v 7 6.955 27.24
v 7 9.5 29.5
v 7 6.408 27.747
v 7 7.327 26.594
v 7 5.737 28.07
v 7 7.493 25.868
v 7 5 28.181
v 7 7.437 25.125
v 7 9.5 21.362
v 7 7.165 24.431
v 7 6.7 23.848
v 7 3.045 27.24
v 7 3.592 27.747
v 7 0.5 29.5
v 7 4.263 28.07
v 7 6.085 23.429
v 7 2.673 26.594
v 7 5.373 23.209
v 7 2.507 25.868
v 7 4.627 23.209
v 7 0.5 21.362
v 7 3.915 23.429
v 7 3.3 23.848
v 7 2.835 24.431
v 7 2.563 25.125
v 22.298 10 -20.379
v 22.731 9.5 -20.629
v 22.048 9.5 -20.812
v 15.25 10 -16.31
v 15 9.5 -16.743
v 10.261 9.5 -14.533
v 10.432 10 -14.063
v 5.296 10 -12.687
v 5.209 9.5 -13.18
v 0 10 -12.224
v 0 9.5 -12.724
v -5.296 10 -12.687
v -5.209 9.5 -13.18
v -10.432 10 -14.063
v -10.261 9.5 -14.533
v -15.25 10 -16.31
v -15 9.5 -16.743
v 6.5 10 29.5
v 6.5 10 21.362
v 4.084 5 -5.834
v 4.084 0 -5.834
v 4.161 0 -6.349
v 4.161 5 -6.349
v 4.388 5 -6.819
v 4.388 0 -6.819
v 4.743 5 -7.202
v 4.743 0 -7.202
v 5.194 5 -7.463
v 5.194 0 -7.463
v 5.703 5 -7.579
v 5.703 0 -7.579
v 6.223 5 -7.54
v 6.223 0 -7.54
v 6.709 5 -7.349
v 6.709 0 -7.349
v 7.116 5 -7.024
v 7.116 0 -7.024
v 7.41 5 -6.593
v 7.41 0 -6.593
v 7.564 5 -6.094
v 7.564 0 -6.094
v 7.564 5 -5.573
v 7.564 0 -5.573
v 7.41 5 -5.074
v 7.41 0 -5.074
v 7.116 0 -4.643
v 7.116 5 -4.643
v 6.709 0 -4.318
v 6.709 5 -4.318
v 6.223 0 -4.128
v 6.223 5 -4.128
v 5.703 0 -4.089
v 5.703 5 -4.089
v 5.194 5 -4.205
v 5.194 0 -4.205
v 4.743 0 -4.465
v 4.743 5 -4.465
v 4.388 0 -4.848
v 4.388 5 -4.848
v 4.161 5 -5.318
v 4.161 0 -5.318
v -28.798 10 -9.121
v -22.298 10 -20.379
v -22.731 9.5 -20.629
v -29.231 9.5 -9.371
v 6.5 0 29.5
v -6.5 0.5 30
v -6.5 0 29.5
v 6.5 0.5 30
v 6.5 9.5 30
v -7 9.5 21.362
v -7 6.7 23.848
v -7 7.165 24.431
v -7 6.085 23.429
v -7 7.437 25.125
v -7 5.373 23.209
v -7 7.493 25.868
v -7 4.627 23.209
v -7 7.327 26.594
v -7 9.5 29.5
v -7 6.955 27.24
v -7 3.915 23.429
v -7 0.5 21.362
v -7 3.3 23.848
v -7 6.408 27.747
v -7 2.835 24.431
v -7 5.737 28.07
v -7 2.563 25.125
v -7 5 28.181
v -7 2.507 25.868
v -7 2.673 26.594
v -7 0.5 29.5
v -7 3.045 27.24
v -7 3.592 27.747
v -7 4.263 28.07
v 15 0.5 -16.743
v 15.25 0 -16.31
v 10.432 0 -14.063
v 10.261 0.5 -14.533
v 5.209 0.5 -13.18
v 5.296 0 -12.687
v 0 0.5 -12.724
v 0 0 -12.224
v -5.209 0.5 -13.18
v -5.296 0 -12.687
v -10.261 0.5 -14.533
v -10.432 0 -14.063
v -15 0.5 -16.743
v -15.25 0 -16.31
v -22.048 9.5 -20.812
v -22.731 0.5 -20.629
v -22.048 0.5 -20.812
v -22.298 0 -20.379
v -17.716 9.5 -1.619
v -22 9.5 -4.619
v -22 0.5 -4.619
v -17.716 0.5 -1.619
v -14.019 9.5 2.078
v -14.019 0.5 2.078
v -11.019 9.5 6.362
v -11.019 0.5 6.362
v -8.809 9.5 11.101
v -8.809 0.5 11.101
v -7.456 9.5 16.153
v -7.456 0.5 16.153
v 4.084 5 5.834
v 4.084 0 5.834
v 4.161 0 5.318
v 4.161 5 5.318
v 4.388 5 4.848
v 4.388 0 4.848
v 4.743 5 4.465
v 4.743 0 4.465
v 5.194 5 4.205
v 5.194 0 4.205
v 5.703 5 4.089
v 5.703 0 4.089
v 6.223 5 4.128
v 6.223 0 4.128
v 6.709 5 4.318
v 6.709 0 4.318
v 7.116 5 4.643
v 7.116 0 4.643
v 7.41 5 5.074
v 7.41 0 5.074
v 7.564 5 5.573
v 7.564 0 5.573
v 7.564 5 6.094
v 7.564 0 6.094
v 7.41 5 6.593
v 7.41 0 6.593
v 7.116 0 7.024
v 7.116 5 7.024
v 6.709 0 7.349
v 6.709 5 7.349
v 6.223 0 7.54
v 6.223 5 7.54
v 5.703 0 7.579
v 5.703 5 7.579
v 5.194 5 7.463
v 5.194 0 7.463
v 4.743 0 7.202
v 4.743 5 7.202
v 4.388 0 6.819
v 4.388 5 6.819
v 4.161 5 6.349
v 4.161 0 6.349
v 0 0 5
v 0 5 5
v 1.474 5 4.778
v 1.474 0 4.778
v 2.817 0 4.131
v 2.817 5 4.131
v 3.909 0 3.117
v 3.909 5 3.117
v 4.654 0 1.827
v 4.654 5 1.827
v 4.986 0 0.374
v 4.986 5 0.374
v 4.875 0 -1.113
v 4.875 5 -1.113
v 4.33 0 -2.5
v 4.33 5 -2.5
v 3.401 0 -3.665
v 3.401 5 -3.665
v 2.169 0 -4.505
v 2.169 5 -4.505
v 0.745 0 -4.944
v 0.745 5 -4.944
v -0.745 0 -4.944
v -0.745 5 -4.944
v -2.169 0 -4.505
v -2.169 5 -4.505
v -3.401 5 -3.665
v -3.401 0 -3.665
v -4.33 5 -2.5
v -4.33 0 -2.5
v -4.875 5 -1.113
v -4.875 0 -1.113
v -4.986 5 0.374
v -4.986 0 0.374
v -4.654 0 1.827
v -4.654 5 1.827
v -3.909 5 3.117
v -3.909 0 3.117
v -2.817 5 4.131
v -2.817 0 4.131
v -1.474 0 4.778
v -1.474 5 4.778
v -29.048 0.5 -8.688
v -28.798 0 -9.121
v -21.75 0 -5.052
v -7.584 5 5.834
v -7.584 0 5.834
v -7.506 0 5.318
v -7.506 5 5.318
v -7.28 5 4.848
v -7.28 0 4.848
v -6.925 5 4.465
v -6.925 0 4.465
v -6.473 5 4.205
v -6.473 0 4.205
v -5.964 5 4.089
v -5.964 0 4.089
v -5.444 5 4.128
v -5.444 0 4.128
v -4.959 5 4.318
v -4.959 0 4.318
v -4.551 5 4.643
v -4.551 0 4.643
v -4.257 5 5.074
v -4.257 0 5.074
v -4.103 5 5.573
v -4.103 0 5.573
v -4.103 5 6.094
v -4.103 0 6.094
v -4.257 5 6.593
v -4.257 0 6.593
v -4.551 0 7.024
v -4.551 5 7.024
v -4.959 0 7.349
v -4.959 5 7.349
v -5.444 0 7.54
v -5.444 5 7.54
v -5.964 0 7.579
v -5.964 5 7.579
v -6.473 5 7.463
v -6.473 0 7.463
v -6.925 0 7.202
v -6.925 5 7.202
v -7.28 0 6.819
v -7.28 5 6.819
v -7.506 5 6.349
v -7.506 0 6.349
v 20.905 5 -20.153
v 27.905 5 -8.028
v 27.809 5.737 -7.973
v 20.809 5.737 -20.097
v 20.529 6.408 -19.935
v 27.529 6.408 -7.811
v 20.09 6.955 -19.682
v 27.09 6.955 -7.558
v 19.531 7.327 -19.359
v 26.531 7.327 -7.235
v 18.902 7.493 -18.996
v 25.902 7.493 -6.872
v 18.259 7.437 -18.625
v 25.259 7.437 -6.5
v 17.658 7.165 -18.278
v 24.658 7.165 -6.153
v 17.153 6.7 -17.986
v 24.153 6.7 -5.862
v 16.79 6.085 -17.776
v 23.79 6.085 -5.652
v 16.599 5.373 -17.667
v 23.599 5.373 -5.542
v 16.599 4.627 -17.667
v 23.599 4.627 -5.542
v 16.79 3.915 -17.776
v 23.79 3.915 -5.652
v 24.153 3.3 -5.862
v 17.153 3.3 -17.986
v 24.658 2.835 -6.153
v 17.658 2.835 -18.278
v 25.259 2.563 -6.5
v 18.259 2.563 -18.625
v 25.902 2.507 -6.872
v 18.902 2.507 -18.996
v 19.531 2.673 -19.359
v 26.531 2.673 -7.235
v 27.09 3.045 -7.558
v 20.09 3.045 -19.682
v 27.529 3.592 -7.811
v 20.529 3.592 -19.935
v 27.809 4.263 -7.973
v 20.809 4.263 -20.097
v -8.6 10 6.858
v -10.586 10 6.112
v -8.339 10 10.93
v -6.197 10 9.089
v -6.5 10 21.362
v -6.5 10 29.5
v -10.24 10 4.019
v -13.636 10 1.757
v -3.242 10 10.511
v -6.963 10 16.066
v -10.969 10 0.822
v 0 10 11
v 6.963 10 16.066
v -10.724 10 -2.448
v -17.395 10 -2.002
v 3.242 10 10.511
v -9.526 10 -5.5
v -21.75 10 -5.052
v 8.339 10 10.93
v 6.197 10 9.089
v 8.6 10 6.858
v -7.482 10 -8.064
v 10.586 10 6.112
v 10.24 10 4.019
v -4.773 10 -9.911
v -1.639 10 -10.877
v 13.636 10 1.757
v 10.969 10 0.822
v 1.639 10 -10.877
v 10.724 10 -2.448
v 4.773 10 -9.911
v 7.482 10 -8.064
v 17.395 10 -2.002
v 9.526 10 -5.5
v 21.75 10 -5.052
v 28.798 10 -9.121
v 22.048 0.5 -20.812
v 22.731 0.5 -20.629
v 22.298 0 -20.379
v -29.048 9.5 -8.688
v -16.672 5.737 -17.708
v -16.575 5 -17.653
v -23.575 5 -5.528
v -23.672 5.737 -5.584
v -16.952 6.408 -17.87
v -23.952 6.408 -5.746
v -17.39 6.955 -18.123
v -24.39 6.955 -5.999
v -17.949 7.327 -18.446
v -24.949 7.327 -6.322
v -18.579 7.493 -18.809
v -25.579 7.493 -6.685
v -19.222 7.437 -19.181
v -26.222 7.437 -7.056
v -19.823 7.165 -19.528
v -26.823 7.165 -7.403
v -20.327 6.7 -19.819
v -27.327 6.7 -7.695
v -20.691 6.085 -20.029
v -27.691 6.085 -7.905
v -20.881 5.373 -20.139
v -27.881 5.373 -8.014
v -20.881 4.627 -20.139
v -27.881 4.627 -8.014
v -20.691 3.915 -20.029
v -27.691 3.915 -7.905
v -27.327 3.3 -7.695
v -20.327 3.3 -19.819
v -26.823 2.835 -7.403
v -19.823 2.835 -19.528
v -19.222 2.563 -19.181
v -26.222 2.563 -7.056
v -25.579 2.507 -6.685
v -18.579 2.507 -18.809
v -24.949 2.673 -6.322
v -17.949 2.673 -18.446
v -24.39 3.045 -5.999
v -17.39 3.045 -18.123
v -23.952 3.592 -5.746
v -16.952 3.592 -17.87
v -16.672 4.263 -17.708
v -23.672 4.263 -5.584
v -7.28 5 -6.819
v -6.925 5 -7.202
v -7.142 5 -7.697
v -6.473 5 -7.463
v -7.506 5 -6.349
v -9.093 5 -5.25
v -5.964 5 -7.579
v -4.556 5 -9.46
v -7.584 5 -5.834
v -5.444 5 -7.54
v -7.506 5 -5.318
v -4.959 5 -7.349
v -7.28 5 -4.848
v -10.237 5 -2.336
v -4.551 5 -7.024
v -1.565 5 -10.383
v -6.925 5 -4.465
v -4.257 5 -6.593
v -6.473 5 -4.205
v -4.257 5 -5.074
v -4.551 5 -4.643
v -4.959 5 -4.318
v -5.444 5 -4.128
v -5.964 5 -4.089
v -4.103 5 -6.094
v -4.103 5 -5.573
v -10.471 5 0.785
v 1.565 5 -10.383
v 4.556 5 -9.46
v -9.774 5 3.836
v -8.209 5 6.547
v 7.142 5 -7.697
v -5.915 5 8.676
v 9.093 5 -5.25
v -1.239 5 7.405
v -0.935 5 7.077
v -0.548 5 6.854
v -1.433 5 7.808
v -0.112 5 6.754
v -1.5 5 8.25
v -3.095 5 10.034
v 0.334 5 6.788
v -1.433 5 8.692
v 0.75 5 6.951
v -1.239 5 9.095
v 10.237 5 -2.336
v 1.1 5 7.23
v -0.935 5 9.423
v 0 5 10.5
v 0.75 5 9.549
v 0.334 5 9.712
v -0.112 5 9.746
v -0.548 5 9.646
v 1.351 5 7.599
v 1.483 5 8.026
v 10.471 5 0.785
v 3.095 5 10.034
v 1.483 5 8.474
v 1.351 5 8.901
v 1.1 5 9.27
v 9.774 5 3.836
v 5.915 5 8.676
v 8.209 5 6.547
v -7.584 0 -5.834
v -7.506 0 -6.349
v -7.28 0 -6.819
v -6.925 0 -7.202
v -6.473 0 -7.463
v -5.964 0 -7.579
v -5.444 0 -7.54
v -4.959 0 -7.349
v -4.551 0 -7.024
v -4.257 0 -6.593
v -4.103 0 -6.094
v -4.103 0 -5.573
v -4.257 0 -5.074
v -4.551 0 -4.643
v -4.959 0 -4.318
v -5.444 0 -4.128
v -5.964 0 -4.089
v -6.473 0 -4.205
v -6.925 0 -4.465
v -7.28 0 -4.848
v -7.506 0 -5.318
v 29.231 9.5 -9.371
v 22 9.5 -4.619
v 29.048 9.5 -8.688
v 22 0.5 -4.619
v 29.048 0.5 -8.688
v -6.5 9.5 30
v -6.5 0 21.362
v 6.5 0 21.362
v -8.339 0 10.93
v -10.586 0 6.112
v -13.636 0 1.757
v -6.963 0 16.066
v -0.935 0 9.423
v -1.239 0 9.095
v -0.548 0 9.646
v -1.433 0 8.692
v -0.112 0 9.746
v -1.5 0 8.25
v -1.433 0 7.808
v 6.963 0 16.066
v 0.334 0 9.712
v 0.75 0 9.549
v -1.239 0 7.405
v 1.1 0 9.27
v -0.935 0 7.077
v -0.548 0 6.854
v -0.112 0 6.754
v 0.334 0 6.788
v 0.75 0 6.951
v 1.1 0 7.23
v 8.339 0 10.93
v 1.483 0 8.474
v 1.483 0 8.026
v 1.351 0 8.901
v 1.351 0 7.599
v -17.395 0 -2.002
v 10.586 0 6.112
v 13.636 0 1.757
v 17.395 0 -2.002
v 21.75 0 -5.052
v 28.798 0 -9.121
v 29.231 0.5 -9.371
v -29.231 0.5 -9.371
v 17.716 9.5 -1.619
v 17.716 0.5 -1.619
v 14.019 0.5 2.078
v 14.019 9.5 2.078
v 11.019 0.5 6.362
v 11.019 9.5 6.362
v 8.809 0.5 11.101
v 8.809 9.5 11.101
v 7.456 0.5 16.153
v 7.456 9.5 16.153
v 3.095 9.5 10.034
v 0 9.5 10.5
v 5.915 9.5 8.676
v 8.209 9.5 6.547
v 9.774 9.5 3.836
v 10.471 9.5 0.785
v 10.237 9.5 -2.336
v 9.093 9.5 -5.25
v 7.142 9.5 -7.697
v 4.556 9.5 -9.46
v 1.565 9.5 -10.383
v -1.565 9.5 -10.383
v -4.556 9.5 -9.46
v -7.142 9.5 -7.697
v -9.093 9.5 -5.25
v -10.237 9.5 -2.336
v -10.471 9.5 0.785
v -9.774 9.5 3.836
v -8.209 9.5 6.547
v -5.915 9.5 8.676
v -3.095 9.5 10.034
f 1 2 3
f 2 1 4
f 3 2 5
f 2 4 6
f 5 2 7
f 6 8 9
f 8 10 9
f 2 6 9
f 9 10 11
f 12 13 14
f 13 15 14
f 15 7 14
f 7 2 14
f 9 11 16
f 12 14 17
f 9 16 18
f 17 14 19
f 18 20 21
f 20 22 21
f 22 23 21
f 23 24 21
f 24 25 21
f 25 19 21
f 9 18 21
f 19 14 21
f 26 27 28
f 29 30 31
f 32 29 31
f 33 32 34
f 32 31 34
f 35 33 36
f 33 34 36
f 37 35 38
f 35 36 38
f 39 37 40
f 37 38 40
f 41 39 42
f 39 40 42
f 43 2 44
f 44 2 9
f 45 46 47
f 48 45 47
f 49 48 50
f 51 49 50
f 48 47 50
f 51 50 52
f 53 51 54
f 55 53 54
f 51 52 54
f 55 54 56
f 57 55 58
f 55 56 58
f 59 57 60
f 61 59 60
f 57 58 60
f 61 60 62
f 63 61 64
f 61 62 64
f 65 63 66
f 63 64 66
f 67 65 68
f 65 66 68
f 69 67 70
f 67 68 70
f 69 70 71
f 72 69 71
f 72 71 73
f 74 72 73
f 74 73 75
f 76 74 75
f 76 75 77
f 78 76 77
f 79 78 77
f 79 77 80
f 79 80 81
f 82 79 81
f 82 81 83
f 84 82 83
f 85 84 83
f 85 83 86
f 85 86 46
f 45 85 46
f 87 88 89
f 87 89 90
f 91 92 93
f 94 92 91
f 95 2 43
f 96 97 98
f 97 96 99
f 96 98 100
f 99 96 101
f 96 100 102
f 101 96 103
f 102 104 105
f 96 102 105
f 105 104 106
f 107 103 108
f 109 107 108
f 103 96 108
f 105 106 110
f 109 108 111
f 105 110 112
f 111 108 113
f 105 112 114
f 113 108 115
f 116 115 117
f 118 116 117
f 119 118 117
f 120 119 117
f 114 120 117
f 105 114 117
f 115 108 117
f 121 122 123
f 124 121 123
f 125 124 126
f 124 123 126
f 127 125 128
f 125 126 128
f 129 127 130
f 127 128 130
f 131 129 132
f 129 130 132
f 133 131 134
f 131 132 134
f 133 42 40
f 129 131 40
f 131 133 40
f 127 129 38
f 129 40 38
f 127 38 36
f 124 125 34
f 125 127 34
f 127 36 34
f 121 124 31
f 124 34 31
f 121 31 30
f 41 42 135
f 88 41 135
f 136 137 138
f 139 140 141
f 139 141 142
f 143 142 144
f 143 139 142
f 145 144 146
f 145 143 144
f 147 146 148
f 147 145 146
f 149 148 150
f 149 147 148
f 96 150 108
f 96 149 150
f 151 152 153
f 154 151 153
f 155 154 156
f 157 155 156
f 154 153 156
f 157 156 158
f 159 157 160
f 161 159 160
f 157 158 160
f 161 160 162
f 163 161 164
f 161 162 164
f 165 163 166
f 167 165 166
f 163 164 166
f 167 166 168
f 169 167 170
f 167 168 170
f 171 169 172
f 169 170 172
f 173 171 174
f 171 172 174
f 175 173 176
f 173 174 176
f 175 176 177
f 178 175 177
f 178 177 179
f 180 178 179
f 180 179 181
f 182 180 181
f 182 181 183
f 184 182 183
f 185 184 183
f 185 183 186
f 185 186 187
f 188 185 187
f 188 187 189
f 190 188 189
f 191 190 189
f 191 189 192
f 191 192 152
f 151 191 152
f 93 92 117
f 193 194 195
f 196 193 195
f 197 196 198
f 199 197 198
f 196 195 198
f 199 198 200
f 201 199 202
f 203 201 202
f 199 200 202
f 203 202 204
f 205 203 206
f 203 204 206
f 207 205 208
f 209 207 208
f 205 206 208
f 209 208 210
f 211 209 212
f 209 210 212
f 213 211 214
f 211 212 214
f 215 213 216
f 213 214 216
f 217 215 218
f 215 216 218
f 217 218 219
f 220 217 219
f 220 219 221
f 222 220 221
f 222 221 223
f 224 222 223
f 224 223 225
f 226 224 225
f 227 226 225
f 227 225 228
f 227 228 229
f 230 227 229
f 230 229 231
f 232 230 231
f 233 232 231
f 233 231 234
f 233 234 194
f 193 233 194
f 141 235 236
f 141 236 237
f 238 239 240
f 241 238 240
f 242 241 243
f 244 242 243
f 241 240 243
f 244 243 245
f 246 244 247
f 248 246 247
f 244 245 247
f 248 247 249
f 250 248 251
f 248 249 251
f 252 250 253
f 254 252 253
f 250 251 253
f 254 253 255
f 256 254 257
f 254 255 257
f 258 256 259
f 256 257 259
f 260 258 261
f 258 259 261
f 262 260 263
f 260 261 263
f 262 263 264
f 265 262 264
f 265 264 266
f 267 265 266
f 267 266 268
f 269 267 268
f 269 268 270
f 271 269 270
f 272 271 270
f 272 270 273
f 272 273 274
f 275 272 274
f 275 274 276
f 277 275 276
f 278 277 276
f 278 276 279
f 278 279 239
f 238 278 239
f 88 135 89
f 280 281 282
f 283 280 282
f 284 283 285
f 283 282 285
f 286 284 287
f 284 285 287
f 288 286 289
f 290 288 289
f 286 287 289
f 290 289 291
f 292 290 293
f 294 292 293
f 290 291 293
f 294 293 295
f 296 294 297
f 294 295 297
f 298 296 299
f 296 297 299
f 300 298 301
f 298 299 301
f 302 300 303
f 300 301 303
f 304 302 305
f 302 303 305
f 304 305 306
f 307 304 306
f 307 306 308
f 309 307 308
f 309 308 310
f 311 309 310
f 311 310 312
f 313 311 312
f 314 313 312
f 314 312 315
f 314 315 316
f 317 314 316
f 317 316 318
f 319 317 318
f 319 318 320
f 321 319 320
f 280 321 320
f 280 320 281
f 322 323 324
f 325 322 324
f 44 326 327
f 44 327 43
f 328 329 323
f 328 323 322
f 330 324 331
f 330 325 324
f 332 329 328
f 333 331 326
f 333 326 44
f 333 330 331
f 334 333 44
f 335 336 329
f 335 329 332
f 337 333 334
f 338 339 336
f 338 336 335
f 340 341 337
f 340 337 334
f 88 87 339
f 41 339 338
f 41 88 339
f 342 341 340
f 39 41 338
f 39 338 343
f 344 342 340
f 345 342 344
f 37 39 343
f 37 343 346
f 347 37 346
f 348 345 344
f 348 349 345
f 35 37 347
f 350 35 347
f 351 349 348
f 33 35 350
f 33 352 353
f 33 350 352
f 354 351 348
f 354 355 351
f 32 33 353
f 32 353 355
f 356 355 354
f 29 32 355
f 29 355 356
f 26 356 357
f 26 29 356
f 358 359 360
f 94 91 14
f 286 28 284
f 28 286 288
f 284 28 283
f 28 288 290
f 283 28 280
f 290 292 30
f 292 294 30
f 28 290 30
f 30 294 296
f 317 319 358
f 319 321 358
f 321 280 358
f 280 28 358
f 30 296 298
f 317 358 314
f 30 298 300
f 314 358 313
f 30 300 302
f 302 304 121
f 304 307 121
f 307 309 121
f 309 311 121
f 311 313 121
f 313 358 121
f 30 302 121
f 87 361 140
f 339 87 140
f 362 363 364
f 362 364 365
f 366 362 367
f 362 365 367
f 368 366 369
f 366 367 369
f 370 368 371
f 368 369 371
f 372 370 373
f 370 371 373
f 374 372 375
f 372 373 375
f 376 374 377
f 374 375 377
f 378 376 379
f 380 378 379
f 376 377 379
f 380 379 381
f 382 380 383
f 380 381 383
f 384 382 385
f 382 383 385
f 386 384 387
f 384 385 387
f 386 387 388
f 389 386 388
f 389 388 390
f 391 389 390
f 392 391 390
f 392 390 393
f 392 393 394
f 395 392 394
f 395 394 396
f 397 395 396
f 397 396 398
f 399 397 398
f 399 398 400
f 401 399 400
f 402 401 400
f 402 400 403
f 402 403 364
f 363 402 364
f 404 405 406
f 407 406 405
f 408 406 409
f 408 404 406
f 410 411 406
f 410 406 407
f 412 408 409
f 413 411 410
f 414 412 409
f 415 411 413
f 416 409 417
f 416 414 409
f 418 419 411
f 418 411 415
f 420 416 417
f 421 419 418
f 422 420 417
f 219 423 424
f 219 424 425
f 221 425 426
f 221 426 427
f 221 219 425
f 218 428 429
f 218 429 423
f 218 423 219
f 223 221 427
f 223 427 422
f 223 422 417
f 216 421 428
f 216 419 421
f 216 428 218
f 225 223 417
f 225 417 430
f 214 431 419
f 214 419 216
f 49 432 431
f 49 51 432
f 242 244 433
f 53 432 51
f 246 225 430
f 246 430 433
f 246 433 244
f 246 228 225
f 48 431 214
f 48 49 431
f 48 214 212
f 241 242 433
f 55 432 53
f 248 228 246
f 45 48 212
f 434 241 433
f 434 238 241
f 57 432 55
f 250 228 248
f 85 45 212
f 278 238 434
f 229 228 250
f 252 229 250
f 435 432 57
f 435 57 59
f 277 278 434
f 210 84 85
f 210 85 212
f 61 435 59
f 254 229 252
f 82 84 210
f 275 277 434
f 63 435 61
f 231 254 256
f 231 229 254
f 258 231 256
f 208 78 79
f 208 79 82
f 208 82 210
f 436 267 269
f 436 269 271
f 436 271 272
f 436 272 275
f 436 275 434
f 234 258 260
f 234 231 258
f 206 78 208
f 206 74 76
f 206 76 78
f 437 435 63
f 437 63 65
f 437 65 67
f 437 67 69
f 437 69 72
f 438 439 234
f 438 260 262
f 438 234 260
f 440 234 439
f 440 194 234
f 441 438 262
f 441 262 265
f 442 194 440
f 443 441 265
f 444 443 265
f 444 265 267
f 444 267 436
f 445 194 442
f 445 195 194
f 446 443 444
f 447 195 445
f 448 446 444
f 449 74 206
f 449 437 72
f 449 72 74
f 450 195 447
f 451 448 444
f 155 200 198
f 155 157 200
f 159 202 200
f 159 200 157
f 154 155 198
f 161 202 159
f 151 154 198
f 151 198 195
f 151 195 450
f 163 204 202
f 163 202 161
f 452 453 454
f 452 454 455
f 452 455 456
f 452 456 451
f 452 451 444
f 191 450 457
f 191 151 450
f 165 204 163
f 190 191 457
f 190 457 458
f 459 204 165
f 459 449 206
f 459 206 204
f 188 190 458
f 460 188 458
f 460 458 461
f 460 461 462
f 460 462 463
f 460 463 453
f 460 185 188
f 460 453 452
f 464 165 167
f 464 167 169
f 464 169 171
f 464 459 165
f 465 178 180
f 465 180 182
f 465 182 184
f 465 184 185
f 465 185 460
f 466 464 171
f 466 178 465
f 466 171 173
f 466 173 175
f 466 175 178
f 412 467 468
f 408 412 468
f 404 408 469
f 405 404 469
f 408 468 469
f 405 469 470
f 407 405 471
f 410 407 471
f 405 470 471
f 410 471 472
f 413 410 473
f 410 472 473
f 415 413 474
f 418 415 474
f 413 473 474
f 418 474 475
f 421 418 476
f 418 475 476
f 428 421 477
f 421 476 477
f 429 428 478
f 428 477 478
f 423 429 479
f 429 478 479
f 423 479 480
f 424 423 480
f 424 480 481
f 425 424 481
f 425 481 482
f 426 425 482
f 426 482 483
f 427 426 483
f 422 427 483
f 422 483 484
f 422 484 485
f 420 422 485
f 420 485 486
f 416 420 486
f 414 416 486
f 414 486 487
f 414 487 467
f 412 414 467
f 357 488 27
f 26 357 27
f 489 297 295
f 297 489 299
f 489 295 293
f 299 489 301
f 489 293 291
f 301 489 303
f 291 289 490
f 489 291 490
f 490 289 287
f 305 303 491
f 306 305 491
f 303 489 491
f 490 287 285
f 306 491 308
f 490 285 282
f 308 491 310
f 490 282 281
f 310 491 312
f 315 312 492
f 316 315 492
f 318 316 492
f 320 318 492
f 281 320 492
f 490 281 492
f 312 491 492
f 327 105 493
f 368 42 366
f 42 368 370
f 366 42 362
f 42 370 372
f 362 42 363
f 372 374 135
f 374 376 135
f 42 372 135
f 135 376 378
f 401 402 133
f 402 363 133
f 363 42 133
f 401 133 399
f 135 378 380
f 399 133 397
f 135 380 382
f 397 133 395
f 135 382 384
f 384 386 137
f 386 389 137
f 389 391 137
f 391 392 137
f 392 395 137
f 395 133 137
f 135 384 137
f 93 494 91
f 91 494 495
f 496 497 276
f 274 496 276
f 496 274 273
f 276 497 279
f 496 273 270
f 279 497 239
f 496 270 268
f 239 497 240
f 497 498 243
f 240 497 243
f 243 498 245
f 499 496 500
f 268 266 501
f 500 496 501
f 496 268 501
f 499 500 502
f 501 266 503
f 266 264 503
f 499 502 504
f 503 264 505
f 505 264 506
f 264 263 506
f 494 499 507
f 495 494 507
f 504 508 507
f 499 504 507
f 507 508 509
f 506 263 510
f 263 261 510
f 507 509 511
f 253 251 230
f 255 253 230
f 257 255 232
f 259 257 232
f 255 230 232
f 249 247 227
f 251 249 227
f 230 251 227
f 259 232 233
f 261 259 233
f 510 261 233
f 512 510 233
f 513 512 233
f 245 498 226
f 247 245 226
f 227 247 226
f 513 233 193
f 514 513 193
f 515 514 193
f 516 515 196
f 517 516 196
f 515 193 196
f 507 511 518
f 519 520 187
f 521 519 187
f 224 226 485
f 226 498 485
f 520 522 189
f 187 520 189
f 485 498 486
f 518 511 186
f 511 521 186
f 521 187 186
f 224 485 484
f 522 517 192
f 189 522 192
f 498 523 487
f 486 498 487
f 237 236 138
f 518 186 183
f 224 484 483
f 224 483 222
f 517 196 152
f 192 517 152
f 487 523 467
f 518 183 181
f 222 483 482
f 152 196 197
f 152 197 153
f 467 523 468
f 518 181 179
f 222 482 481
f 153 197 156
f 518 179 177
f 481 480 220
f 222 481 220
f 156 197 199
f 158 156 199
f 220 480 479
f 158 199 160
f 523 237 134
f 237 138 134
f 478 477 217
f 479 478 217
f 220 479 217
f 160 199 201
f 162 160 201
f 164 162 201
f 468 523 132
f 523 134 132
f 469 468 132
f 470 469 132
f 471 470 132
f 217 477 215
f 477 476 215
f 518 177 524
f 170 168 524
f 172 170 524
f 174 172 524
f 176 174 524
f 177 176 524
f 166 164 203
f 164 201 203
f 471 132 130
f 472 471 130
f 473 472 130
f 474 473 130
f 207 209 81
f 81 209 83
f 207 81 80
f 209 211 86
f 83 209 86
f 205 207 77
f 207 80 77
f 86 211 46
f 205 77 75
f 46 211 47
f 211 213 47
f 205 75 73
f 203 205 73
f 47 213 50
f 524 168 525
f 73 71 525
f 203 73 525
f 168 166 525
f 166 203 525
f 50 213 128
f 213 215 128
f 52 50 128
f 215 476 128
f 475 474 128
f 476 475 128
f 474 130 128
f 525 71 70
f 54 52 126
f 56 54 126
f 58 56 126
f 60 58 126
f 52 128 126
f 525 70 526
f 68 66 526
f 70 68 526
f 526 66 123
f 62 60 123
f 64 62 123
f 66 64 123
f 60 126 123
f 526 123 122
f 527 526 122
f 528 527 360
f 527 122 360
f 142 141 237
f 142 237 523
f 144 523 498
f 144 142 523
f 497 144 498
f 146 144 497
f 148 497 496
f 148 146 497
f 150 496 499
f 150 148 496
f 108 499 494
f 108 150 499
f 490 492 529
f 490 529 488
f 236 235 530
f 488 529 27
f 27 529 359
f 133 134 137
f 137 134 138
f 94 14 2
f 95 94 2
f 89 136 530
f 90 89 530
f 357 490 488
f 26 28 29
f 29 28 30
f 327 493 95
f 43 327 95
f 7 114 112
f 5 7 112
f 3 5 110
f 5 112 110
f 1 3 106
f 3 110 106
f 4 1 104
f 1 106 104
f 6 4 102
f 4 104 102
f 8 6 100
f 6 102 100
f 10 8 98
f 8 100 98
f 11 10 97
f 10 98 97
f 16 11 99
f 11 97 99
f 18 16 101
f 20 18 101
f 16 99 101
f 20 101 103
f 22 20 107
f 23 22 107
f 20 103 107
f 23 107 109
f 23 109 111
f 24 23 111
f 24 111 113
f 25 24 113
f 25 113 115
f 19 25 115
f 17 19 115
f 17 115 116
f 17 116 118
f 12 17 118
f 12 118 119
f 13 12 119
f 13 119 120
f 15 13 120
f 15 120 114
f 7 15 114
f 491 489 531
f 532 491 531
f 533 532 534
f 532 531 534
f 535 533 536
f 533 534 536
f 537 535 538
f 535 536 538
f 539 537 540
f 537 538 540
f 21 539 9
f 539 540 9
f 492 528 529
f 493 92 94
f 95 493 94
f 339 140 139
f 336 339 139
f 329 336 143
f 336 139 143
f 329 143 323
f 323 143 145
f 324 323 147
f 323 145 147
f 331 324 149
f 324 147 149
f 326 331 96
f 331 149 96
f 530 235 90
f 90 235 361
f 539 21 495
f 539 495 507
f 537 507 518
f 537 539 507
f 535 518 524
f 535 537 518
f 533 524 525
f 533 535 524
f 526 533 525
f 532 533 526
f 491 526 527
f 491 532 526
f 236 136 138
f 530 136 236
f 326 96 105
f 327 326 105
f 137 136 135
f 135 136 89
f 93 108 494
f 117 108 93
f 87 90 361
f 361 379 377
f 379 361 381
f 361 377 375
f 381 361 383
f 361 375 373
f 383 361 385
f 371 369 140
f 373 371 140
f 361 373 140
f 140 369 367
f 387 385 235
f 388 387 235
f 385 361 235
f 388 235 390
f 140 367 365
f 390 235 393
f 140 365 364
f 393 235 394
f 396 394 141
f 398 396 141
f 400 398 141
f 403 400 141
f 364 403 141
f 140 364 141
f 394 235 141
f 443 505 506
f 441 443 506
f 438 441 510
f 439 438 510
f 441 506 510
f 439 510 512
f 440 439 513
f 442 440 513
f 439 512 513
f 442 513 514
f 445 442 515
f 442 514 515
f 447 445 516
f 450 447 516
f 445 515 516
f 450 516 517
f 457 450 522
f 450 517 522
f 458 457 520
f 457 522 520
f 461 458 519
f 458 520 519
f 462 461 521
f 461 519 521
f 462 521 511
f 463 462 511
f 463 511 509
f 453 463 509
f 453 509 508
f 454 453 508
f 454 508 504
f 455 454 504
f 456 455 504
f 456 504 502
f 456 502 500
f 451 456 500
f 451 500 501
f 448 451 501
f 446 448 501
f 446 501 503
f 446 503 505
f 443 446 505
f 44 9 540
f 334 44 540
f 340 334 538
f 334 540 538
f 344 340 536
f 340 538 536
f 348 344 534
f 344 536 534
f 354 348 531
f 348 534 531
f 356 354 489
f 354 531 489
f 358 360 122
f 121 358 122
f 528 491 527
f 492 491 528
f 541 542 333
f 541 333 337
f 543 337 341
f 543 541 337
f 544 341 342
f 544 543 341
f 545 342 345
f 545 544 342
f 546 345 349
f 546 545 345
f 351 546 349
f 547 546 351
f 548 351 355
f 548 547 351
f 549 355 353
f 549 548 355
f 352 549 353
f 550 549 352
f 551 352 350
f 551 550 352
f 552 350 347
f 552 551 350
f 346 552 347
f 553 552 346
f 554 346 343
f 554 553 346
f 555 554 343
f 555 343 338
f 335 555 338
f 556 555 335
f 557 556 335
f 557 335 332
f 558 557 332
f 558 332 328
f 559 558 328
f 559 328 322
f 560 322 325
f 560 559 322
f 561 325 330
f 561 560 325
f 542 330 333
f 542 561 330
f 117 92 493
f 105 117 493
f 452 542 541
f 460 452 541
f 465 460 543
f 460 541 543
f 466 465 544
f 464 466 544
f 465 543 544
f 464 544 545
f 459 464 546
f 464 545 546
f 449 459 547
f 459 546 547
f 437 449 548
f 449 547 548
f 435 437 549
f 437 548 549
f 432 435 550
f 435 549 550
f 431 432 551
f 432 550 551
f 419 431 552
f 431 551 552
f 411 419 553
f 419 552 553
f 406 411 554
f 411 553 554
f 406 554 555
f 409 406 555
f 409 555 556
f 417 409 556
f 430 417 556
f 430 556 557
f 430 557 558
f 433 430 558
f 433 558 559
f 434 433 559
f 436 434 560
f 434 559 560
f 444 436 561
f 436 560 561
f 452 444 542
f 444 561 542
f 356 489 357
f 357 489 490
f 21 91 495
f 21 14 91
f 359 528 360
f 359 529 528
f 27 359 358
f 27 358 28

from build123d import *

# Parameters (mm, degrees)
BOSS_EXTRUDE1_DEPTH       = 10
SKETCH8_R                 = 5
CUT_EXTRUDE1_DEPTH        = 44.233266529
FILLET1_R                 = 30
M6X1_0_TAPPED_HOLE1_D     = 5
M6X1_0_TAPPED_HOLE2_D     = 5
M6X1_0_TAPPED_HOLE3_D     = 5
M3_CLEARANCE_HOLE2_D      = 3.5
M3_CLEARANCE_HOLE2_DEPTH  = 12.1
M3_CLEARANCE_HOLE2_TIP    = 1.051506083
F_3_0MM_DOWEL_HOLE2_D     = 3
F_3_0MM_DOWEL_HOLE2_DEPTH = 12.1
F_3_0MM_DOWEL_HOLE2_TIP   = 0.901290929
SKETCH29_R                = 10.5
CUT_EXTRUDE2_DEPTH        = 5
CHAMFER2_SIZE             = 0.5


with BuildPart() as part:
    # Sketch2 → Boss-Extrude1 (new body)
    with BuildSketch(Plane(origin=(0, 0, 0), x_dir=(1, 0, 0), z_dir=(0, 1, 0))):
        Polygon((-22.480762114, 21.062177826), (-29.480762114, 8.937822174), (-7, -4.041451884), (-7, -30), (7, -30), (7, -4.041451884), (29.480762114, 8.937822174), (22.480762114, 21.062177826), (0, 8.082903769), align=None)
    extrude(amount=BOSS_EXTRUDE1_DEPTH)

    # Sketch8 → Cut-Extrude1 (cut, through all)
    with BuildSketch(Plane(origin=(0, 10, 0), x_dir=(1, 0, 0), z_dir=(0, 1, 0))):
        with Locations(Location((0, 0, 0), (0, 0, 270))):
            Circle(SKETCH8_R)
    extrude(amount=-CUT_EXTRUDE1_DEPTH, mode=Mode.SUBTRACT)

    # Fillet1
    fillet1_edges = [part.edges().sort_by_distance(p)[0] for p in [
        (-7, 5, 4.041451884),
        (0, 5, -8.082903769),
        (7, 5, 4.041451884),
    ]]
    fillet(fillet1_edges, radius=FILLET1_R)

    # M6x1.0 Tapped Hole1 (through all)
    with Locations(Plane(origin=(-3.5, 0, -6.062177826), x_dir=(-0.8660254037844384, 0, 0.5000000000000007), z_dir=(-0.5000000000000007, 0, -0.8660254037844384))):
        with Locations((-25.68097998, 5)):
            Hole(M6X1_0_TAPPED_HOLE1_D / 2)

    # M6x1.0 Tapped Hole2 (through all)
    with Locations(Plane(origin=(3.5, 0, -6.062177826), x_dir=(-0.8660254037844383, 0, -0.5000000000000009), z_dir=(0.5000000000000008, 0, -0.8660254037844382))):
        with Locations((25.68097998, 5)):
            Hole(M6X1_0_TAPPED_HOLE2_D / 2)

    # M6x1.0 Tapped Hole3 (through all)
    with Locations(Plane(origin=(7, 0, 0), x_dir=(0, 0, -1), z_dir=(1, 0, 0))):
        with Locations((-25.68097998, 5)):
            Hole(M6X1_0_TAPPED_HOLE3_D / 2)

    # M3 Clearance Hole2
    with Locations(Plane(origin=(0, 10, 0), x_dir=(1, 0, 0), z_dir=(0, 1, 0))):
        with Locations((5.833630945, 5.833630945), (5.833630945, -5.833630945), (-5.833630945, -5.833630945), (-5.833630945, 5.833630945), (0, 0)):
            Hole(M3_CLEARANCE_HOLE2_D / 2, depth=M3_CLEARANCE_HOLE2_DEPTH)
            with Locations((0, 0, -(M3_CLEARANCE_HOLE2_DEPTH + M3_CLEARANCE_HOLE2_TIP / 2))):  # 118° drill point
                Cone(0, M3_CLEARANCE_HOLE2_D / 2, M3_CLEARANCE_HOLE2_TIP, mode=Mode.SUBTRACT)

    # Ø3.0mm Dowel Hole2
    with Locations(Plane(origin=(0, 10, 0), x_dir=(1, 0, 0), z_dir=(0, 1, 0))):
        with Locations((0, -8.25)):
            Hole(F_3_0MM_DOWEL_HOLE2_D / 2, depth=F_3_0MM_DOWEL_HOLE2_DEPTH)
            with Locations((0, 0, -(F_3_0MM_DOWEL_HOLE2_DEPTH + F_3_0MM_DOWEL_HOLE2_TIP / 2))):  # 118° drill point
                Cone(0, F_3_0MM_DOWEL_HOLE2_D / 2, F_3_0MM_DOWEL_HOLE2_TIP, mode=Mode.SUBTRACT)

    # Sketch29 → Cut-Extrude2 (cut)
    with BuildSketch(Plane(origin=(0, 10, 0), x_dir=(1, 0, 0), z_dir=(0, 1, 0))):
        with Locations(Location((0, 0, 0), (0, 0, 270))):
            Circle(SKETCH29_R)
    extrude(amount=-CUT_EXTRUDE2_DEPTH, mode=Mode.SUBTRACT)

    # Chamfer2
    chamfer2_edges = [part.edges().sort_by_distance(p)[0] for p in [
        (7, 10, 25.68097998),
        (25.980762114, 0, -15),
        (7, 0, 25.68097998),
        (0, 10, -10.5),
        (0, 0, 30),
        (-29.480762114, 5, -8.937822174),
        (-22.480762114, 5, -21.062177826),
        (22.480762114, 5, -21.062177826),
        (29.480762114, 5, -8.937822174),
        (7, 5, 30),
        (-7, 5, 30),
        (25.980762114, 10, -15),
        (18.740381057, 10, -18.902667816),
        (-25.980762114, 10, -15),
        (-25.740381057, 10, -6.778312164),
        (25.740381057, 0, -6.778312164),
        (25.740381057, 10, -6.778312164),
        (-7, 0, 25.68097998),
        (-7, 10, 25.68097998),
        (-18.740381057, 0, -18.902667816),
        (-18.740381057, 10, -18.902667816),
        (11.019237886, 0, 6.36195996),
        (11.019237886, 10, 6.36195996),
        (-11.019237886, 0, 6.36195996),
        (-11.019237886, 10, 6.36195996),
        (0, 0, -12.72391992),
        (0, 10, -12.72391992),
        (0, 10, 30),
        (-25.740381057, 0, -6.778312164),
        (-25.980762114, 0, -15),
        (18.740381057, 0, -18.902667816),
    ]]
    chamfer(chamfer2_edges, length=CHAMFER2_SIZE)


solid = part.part
